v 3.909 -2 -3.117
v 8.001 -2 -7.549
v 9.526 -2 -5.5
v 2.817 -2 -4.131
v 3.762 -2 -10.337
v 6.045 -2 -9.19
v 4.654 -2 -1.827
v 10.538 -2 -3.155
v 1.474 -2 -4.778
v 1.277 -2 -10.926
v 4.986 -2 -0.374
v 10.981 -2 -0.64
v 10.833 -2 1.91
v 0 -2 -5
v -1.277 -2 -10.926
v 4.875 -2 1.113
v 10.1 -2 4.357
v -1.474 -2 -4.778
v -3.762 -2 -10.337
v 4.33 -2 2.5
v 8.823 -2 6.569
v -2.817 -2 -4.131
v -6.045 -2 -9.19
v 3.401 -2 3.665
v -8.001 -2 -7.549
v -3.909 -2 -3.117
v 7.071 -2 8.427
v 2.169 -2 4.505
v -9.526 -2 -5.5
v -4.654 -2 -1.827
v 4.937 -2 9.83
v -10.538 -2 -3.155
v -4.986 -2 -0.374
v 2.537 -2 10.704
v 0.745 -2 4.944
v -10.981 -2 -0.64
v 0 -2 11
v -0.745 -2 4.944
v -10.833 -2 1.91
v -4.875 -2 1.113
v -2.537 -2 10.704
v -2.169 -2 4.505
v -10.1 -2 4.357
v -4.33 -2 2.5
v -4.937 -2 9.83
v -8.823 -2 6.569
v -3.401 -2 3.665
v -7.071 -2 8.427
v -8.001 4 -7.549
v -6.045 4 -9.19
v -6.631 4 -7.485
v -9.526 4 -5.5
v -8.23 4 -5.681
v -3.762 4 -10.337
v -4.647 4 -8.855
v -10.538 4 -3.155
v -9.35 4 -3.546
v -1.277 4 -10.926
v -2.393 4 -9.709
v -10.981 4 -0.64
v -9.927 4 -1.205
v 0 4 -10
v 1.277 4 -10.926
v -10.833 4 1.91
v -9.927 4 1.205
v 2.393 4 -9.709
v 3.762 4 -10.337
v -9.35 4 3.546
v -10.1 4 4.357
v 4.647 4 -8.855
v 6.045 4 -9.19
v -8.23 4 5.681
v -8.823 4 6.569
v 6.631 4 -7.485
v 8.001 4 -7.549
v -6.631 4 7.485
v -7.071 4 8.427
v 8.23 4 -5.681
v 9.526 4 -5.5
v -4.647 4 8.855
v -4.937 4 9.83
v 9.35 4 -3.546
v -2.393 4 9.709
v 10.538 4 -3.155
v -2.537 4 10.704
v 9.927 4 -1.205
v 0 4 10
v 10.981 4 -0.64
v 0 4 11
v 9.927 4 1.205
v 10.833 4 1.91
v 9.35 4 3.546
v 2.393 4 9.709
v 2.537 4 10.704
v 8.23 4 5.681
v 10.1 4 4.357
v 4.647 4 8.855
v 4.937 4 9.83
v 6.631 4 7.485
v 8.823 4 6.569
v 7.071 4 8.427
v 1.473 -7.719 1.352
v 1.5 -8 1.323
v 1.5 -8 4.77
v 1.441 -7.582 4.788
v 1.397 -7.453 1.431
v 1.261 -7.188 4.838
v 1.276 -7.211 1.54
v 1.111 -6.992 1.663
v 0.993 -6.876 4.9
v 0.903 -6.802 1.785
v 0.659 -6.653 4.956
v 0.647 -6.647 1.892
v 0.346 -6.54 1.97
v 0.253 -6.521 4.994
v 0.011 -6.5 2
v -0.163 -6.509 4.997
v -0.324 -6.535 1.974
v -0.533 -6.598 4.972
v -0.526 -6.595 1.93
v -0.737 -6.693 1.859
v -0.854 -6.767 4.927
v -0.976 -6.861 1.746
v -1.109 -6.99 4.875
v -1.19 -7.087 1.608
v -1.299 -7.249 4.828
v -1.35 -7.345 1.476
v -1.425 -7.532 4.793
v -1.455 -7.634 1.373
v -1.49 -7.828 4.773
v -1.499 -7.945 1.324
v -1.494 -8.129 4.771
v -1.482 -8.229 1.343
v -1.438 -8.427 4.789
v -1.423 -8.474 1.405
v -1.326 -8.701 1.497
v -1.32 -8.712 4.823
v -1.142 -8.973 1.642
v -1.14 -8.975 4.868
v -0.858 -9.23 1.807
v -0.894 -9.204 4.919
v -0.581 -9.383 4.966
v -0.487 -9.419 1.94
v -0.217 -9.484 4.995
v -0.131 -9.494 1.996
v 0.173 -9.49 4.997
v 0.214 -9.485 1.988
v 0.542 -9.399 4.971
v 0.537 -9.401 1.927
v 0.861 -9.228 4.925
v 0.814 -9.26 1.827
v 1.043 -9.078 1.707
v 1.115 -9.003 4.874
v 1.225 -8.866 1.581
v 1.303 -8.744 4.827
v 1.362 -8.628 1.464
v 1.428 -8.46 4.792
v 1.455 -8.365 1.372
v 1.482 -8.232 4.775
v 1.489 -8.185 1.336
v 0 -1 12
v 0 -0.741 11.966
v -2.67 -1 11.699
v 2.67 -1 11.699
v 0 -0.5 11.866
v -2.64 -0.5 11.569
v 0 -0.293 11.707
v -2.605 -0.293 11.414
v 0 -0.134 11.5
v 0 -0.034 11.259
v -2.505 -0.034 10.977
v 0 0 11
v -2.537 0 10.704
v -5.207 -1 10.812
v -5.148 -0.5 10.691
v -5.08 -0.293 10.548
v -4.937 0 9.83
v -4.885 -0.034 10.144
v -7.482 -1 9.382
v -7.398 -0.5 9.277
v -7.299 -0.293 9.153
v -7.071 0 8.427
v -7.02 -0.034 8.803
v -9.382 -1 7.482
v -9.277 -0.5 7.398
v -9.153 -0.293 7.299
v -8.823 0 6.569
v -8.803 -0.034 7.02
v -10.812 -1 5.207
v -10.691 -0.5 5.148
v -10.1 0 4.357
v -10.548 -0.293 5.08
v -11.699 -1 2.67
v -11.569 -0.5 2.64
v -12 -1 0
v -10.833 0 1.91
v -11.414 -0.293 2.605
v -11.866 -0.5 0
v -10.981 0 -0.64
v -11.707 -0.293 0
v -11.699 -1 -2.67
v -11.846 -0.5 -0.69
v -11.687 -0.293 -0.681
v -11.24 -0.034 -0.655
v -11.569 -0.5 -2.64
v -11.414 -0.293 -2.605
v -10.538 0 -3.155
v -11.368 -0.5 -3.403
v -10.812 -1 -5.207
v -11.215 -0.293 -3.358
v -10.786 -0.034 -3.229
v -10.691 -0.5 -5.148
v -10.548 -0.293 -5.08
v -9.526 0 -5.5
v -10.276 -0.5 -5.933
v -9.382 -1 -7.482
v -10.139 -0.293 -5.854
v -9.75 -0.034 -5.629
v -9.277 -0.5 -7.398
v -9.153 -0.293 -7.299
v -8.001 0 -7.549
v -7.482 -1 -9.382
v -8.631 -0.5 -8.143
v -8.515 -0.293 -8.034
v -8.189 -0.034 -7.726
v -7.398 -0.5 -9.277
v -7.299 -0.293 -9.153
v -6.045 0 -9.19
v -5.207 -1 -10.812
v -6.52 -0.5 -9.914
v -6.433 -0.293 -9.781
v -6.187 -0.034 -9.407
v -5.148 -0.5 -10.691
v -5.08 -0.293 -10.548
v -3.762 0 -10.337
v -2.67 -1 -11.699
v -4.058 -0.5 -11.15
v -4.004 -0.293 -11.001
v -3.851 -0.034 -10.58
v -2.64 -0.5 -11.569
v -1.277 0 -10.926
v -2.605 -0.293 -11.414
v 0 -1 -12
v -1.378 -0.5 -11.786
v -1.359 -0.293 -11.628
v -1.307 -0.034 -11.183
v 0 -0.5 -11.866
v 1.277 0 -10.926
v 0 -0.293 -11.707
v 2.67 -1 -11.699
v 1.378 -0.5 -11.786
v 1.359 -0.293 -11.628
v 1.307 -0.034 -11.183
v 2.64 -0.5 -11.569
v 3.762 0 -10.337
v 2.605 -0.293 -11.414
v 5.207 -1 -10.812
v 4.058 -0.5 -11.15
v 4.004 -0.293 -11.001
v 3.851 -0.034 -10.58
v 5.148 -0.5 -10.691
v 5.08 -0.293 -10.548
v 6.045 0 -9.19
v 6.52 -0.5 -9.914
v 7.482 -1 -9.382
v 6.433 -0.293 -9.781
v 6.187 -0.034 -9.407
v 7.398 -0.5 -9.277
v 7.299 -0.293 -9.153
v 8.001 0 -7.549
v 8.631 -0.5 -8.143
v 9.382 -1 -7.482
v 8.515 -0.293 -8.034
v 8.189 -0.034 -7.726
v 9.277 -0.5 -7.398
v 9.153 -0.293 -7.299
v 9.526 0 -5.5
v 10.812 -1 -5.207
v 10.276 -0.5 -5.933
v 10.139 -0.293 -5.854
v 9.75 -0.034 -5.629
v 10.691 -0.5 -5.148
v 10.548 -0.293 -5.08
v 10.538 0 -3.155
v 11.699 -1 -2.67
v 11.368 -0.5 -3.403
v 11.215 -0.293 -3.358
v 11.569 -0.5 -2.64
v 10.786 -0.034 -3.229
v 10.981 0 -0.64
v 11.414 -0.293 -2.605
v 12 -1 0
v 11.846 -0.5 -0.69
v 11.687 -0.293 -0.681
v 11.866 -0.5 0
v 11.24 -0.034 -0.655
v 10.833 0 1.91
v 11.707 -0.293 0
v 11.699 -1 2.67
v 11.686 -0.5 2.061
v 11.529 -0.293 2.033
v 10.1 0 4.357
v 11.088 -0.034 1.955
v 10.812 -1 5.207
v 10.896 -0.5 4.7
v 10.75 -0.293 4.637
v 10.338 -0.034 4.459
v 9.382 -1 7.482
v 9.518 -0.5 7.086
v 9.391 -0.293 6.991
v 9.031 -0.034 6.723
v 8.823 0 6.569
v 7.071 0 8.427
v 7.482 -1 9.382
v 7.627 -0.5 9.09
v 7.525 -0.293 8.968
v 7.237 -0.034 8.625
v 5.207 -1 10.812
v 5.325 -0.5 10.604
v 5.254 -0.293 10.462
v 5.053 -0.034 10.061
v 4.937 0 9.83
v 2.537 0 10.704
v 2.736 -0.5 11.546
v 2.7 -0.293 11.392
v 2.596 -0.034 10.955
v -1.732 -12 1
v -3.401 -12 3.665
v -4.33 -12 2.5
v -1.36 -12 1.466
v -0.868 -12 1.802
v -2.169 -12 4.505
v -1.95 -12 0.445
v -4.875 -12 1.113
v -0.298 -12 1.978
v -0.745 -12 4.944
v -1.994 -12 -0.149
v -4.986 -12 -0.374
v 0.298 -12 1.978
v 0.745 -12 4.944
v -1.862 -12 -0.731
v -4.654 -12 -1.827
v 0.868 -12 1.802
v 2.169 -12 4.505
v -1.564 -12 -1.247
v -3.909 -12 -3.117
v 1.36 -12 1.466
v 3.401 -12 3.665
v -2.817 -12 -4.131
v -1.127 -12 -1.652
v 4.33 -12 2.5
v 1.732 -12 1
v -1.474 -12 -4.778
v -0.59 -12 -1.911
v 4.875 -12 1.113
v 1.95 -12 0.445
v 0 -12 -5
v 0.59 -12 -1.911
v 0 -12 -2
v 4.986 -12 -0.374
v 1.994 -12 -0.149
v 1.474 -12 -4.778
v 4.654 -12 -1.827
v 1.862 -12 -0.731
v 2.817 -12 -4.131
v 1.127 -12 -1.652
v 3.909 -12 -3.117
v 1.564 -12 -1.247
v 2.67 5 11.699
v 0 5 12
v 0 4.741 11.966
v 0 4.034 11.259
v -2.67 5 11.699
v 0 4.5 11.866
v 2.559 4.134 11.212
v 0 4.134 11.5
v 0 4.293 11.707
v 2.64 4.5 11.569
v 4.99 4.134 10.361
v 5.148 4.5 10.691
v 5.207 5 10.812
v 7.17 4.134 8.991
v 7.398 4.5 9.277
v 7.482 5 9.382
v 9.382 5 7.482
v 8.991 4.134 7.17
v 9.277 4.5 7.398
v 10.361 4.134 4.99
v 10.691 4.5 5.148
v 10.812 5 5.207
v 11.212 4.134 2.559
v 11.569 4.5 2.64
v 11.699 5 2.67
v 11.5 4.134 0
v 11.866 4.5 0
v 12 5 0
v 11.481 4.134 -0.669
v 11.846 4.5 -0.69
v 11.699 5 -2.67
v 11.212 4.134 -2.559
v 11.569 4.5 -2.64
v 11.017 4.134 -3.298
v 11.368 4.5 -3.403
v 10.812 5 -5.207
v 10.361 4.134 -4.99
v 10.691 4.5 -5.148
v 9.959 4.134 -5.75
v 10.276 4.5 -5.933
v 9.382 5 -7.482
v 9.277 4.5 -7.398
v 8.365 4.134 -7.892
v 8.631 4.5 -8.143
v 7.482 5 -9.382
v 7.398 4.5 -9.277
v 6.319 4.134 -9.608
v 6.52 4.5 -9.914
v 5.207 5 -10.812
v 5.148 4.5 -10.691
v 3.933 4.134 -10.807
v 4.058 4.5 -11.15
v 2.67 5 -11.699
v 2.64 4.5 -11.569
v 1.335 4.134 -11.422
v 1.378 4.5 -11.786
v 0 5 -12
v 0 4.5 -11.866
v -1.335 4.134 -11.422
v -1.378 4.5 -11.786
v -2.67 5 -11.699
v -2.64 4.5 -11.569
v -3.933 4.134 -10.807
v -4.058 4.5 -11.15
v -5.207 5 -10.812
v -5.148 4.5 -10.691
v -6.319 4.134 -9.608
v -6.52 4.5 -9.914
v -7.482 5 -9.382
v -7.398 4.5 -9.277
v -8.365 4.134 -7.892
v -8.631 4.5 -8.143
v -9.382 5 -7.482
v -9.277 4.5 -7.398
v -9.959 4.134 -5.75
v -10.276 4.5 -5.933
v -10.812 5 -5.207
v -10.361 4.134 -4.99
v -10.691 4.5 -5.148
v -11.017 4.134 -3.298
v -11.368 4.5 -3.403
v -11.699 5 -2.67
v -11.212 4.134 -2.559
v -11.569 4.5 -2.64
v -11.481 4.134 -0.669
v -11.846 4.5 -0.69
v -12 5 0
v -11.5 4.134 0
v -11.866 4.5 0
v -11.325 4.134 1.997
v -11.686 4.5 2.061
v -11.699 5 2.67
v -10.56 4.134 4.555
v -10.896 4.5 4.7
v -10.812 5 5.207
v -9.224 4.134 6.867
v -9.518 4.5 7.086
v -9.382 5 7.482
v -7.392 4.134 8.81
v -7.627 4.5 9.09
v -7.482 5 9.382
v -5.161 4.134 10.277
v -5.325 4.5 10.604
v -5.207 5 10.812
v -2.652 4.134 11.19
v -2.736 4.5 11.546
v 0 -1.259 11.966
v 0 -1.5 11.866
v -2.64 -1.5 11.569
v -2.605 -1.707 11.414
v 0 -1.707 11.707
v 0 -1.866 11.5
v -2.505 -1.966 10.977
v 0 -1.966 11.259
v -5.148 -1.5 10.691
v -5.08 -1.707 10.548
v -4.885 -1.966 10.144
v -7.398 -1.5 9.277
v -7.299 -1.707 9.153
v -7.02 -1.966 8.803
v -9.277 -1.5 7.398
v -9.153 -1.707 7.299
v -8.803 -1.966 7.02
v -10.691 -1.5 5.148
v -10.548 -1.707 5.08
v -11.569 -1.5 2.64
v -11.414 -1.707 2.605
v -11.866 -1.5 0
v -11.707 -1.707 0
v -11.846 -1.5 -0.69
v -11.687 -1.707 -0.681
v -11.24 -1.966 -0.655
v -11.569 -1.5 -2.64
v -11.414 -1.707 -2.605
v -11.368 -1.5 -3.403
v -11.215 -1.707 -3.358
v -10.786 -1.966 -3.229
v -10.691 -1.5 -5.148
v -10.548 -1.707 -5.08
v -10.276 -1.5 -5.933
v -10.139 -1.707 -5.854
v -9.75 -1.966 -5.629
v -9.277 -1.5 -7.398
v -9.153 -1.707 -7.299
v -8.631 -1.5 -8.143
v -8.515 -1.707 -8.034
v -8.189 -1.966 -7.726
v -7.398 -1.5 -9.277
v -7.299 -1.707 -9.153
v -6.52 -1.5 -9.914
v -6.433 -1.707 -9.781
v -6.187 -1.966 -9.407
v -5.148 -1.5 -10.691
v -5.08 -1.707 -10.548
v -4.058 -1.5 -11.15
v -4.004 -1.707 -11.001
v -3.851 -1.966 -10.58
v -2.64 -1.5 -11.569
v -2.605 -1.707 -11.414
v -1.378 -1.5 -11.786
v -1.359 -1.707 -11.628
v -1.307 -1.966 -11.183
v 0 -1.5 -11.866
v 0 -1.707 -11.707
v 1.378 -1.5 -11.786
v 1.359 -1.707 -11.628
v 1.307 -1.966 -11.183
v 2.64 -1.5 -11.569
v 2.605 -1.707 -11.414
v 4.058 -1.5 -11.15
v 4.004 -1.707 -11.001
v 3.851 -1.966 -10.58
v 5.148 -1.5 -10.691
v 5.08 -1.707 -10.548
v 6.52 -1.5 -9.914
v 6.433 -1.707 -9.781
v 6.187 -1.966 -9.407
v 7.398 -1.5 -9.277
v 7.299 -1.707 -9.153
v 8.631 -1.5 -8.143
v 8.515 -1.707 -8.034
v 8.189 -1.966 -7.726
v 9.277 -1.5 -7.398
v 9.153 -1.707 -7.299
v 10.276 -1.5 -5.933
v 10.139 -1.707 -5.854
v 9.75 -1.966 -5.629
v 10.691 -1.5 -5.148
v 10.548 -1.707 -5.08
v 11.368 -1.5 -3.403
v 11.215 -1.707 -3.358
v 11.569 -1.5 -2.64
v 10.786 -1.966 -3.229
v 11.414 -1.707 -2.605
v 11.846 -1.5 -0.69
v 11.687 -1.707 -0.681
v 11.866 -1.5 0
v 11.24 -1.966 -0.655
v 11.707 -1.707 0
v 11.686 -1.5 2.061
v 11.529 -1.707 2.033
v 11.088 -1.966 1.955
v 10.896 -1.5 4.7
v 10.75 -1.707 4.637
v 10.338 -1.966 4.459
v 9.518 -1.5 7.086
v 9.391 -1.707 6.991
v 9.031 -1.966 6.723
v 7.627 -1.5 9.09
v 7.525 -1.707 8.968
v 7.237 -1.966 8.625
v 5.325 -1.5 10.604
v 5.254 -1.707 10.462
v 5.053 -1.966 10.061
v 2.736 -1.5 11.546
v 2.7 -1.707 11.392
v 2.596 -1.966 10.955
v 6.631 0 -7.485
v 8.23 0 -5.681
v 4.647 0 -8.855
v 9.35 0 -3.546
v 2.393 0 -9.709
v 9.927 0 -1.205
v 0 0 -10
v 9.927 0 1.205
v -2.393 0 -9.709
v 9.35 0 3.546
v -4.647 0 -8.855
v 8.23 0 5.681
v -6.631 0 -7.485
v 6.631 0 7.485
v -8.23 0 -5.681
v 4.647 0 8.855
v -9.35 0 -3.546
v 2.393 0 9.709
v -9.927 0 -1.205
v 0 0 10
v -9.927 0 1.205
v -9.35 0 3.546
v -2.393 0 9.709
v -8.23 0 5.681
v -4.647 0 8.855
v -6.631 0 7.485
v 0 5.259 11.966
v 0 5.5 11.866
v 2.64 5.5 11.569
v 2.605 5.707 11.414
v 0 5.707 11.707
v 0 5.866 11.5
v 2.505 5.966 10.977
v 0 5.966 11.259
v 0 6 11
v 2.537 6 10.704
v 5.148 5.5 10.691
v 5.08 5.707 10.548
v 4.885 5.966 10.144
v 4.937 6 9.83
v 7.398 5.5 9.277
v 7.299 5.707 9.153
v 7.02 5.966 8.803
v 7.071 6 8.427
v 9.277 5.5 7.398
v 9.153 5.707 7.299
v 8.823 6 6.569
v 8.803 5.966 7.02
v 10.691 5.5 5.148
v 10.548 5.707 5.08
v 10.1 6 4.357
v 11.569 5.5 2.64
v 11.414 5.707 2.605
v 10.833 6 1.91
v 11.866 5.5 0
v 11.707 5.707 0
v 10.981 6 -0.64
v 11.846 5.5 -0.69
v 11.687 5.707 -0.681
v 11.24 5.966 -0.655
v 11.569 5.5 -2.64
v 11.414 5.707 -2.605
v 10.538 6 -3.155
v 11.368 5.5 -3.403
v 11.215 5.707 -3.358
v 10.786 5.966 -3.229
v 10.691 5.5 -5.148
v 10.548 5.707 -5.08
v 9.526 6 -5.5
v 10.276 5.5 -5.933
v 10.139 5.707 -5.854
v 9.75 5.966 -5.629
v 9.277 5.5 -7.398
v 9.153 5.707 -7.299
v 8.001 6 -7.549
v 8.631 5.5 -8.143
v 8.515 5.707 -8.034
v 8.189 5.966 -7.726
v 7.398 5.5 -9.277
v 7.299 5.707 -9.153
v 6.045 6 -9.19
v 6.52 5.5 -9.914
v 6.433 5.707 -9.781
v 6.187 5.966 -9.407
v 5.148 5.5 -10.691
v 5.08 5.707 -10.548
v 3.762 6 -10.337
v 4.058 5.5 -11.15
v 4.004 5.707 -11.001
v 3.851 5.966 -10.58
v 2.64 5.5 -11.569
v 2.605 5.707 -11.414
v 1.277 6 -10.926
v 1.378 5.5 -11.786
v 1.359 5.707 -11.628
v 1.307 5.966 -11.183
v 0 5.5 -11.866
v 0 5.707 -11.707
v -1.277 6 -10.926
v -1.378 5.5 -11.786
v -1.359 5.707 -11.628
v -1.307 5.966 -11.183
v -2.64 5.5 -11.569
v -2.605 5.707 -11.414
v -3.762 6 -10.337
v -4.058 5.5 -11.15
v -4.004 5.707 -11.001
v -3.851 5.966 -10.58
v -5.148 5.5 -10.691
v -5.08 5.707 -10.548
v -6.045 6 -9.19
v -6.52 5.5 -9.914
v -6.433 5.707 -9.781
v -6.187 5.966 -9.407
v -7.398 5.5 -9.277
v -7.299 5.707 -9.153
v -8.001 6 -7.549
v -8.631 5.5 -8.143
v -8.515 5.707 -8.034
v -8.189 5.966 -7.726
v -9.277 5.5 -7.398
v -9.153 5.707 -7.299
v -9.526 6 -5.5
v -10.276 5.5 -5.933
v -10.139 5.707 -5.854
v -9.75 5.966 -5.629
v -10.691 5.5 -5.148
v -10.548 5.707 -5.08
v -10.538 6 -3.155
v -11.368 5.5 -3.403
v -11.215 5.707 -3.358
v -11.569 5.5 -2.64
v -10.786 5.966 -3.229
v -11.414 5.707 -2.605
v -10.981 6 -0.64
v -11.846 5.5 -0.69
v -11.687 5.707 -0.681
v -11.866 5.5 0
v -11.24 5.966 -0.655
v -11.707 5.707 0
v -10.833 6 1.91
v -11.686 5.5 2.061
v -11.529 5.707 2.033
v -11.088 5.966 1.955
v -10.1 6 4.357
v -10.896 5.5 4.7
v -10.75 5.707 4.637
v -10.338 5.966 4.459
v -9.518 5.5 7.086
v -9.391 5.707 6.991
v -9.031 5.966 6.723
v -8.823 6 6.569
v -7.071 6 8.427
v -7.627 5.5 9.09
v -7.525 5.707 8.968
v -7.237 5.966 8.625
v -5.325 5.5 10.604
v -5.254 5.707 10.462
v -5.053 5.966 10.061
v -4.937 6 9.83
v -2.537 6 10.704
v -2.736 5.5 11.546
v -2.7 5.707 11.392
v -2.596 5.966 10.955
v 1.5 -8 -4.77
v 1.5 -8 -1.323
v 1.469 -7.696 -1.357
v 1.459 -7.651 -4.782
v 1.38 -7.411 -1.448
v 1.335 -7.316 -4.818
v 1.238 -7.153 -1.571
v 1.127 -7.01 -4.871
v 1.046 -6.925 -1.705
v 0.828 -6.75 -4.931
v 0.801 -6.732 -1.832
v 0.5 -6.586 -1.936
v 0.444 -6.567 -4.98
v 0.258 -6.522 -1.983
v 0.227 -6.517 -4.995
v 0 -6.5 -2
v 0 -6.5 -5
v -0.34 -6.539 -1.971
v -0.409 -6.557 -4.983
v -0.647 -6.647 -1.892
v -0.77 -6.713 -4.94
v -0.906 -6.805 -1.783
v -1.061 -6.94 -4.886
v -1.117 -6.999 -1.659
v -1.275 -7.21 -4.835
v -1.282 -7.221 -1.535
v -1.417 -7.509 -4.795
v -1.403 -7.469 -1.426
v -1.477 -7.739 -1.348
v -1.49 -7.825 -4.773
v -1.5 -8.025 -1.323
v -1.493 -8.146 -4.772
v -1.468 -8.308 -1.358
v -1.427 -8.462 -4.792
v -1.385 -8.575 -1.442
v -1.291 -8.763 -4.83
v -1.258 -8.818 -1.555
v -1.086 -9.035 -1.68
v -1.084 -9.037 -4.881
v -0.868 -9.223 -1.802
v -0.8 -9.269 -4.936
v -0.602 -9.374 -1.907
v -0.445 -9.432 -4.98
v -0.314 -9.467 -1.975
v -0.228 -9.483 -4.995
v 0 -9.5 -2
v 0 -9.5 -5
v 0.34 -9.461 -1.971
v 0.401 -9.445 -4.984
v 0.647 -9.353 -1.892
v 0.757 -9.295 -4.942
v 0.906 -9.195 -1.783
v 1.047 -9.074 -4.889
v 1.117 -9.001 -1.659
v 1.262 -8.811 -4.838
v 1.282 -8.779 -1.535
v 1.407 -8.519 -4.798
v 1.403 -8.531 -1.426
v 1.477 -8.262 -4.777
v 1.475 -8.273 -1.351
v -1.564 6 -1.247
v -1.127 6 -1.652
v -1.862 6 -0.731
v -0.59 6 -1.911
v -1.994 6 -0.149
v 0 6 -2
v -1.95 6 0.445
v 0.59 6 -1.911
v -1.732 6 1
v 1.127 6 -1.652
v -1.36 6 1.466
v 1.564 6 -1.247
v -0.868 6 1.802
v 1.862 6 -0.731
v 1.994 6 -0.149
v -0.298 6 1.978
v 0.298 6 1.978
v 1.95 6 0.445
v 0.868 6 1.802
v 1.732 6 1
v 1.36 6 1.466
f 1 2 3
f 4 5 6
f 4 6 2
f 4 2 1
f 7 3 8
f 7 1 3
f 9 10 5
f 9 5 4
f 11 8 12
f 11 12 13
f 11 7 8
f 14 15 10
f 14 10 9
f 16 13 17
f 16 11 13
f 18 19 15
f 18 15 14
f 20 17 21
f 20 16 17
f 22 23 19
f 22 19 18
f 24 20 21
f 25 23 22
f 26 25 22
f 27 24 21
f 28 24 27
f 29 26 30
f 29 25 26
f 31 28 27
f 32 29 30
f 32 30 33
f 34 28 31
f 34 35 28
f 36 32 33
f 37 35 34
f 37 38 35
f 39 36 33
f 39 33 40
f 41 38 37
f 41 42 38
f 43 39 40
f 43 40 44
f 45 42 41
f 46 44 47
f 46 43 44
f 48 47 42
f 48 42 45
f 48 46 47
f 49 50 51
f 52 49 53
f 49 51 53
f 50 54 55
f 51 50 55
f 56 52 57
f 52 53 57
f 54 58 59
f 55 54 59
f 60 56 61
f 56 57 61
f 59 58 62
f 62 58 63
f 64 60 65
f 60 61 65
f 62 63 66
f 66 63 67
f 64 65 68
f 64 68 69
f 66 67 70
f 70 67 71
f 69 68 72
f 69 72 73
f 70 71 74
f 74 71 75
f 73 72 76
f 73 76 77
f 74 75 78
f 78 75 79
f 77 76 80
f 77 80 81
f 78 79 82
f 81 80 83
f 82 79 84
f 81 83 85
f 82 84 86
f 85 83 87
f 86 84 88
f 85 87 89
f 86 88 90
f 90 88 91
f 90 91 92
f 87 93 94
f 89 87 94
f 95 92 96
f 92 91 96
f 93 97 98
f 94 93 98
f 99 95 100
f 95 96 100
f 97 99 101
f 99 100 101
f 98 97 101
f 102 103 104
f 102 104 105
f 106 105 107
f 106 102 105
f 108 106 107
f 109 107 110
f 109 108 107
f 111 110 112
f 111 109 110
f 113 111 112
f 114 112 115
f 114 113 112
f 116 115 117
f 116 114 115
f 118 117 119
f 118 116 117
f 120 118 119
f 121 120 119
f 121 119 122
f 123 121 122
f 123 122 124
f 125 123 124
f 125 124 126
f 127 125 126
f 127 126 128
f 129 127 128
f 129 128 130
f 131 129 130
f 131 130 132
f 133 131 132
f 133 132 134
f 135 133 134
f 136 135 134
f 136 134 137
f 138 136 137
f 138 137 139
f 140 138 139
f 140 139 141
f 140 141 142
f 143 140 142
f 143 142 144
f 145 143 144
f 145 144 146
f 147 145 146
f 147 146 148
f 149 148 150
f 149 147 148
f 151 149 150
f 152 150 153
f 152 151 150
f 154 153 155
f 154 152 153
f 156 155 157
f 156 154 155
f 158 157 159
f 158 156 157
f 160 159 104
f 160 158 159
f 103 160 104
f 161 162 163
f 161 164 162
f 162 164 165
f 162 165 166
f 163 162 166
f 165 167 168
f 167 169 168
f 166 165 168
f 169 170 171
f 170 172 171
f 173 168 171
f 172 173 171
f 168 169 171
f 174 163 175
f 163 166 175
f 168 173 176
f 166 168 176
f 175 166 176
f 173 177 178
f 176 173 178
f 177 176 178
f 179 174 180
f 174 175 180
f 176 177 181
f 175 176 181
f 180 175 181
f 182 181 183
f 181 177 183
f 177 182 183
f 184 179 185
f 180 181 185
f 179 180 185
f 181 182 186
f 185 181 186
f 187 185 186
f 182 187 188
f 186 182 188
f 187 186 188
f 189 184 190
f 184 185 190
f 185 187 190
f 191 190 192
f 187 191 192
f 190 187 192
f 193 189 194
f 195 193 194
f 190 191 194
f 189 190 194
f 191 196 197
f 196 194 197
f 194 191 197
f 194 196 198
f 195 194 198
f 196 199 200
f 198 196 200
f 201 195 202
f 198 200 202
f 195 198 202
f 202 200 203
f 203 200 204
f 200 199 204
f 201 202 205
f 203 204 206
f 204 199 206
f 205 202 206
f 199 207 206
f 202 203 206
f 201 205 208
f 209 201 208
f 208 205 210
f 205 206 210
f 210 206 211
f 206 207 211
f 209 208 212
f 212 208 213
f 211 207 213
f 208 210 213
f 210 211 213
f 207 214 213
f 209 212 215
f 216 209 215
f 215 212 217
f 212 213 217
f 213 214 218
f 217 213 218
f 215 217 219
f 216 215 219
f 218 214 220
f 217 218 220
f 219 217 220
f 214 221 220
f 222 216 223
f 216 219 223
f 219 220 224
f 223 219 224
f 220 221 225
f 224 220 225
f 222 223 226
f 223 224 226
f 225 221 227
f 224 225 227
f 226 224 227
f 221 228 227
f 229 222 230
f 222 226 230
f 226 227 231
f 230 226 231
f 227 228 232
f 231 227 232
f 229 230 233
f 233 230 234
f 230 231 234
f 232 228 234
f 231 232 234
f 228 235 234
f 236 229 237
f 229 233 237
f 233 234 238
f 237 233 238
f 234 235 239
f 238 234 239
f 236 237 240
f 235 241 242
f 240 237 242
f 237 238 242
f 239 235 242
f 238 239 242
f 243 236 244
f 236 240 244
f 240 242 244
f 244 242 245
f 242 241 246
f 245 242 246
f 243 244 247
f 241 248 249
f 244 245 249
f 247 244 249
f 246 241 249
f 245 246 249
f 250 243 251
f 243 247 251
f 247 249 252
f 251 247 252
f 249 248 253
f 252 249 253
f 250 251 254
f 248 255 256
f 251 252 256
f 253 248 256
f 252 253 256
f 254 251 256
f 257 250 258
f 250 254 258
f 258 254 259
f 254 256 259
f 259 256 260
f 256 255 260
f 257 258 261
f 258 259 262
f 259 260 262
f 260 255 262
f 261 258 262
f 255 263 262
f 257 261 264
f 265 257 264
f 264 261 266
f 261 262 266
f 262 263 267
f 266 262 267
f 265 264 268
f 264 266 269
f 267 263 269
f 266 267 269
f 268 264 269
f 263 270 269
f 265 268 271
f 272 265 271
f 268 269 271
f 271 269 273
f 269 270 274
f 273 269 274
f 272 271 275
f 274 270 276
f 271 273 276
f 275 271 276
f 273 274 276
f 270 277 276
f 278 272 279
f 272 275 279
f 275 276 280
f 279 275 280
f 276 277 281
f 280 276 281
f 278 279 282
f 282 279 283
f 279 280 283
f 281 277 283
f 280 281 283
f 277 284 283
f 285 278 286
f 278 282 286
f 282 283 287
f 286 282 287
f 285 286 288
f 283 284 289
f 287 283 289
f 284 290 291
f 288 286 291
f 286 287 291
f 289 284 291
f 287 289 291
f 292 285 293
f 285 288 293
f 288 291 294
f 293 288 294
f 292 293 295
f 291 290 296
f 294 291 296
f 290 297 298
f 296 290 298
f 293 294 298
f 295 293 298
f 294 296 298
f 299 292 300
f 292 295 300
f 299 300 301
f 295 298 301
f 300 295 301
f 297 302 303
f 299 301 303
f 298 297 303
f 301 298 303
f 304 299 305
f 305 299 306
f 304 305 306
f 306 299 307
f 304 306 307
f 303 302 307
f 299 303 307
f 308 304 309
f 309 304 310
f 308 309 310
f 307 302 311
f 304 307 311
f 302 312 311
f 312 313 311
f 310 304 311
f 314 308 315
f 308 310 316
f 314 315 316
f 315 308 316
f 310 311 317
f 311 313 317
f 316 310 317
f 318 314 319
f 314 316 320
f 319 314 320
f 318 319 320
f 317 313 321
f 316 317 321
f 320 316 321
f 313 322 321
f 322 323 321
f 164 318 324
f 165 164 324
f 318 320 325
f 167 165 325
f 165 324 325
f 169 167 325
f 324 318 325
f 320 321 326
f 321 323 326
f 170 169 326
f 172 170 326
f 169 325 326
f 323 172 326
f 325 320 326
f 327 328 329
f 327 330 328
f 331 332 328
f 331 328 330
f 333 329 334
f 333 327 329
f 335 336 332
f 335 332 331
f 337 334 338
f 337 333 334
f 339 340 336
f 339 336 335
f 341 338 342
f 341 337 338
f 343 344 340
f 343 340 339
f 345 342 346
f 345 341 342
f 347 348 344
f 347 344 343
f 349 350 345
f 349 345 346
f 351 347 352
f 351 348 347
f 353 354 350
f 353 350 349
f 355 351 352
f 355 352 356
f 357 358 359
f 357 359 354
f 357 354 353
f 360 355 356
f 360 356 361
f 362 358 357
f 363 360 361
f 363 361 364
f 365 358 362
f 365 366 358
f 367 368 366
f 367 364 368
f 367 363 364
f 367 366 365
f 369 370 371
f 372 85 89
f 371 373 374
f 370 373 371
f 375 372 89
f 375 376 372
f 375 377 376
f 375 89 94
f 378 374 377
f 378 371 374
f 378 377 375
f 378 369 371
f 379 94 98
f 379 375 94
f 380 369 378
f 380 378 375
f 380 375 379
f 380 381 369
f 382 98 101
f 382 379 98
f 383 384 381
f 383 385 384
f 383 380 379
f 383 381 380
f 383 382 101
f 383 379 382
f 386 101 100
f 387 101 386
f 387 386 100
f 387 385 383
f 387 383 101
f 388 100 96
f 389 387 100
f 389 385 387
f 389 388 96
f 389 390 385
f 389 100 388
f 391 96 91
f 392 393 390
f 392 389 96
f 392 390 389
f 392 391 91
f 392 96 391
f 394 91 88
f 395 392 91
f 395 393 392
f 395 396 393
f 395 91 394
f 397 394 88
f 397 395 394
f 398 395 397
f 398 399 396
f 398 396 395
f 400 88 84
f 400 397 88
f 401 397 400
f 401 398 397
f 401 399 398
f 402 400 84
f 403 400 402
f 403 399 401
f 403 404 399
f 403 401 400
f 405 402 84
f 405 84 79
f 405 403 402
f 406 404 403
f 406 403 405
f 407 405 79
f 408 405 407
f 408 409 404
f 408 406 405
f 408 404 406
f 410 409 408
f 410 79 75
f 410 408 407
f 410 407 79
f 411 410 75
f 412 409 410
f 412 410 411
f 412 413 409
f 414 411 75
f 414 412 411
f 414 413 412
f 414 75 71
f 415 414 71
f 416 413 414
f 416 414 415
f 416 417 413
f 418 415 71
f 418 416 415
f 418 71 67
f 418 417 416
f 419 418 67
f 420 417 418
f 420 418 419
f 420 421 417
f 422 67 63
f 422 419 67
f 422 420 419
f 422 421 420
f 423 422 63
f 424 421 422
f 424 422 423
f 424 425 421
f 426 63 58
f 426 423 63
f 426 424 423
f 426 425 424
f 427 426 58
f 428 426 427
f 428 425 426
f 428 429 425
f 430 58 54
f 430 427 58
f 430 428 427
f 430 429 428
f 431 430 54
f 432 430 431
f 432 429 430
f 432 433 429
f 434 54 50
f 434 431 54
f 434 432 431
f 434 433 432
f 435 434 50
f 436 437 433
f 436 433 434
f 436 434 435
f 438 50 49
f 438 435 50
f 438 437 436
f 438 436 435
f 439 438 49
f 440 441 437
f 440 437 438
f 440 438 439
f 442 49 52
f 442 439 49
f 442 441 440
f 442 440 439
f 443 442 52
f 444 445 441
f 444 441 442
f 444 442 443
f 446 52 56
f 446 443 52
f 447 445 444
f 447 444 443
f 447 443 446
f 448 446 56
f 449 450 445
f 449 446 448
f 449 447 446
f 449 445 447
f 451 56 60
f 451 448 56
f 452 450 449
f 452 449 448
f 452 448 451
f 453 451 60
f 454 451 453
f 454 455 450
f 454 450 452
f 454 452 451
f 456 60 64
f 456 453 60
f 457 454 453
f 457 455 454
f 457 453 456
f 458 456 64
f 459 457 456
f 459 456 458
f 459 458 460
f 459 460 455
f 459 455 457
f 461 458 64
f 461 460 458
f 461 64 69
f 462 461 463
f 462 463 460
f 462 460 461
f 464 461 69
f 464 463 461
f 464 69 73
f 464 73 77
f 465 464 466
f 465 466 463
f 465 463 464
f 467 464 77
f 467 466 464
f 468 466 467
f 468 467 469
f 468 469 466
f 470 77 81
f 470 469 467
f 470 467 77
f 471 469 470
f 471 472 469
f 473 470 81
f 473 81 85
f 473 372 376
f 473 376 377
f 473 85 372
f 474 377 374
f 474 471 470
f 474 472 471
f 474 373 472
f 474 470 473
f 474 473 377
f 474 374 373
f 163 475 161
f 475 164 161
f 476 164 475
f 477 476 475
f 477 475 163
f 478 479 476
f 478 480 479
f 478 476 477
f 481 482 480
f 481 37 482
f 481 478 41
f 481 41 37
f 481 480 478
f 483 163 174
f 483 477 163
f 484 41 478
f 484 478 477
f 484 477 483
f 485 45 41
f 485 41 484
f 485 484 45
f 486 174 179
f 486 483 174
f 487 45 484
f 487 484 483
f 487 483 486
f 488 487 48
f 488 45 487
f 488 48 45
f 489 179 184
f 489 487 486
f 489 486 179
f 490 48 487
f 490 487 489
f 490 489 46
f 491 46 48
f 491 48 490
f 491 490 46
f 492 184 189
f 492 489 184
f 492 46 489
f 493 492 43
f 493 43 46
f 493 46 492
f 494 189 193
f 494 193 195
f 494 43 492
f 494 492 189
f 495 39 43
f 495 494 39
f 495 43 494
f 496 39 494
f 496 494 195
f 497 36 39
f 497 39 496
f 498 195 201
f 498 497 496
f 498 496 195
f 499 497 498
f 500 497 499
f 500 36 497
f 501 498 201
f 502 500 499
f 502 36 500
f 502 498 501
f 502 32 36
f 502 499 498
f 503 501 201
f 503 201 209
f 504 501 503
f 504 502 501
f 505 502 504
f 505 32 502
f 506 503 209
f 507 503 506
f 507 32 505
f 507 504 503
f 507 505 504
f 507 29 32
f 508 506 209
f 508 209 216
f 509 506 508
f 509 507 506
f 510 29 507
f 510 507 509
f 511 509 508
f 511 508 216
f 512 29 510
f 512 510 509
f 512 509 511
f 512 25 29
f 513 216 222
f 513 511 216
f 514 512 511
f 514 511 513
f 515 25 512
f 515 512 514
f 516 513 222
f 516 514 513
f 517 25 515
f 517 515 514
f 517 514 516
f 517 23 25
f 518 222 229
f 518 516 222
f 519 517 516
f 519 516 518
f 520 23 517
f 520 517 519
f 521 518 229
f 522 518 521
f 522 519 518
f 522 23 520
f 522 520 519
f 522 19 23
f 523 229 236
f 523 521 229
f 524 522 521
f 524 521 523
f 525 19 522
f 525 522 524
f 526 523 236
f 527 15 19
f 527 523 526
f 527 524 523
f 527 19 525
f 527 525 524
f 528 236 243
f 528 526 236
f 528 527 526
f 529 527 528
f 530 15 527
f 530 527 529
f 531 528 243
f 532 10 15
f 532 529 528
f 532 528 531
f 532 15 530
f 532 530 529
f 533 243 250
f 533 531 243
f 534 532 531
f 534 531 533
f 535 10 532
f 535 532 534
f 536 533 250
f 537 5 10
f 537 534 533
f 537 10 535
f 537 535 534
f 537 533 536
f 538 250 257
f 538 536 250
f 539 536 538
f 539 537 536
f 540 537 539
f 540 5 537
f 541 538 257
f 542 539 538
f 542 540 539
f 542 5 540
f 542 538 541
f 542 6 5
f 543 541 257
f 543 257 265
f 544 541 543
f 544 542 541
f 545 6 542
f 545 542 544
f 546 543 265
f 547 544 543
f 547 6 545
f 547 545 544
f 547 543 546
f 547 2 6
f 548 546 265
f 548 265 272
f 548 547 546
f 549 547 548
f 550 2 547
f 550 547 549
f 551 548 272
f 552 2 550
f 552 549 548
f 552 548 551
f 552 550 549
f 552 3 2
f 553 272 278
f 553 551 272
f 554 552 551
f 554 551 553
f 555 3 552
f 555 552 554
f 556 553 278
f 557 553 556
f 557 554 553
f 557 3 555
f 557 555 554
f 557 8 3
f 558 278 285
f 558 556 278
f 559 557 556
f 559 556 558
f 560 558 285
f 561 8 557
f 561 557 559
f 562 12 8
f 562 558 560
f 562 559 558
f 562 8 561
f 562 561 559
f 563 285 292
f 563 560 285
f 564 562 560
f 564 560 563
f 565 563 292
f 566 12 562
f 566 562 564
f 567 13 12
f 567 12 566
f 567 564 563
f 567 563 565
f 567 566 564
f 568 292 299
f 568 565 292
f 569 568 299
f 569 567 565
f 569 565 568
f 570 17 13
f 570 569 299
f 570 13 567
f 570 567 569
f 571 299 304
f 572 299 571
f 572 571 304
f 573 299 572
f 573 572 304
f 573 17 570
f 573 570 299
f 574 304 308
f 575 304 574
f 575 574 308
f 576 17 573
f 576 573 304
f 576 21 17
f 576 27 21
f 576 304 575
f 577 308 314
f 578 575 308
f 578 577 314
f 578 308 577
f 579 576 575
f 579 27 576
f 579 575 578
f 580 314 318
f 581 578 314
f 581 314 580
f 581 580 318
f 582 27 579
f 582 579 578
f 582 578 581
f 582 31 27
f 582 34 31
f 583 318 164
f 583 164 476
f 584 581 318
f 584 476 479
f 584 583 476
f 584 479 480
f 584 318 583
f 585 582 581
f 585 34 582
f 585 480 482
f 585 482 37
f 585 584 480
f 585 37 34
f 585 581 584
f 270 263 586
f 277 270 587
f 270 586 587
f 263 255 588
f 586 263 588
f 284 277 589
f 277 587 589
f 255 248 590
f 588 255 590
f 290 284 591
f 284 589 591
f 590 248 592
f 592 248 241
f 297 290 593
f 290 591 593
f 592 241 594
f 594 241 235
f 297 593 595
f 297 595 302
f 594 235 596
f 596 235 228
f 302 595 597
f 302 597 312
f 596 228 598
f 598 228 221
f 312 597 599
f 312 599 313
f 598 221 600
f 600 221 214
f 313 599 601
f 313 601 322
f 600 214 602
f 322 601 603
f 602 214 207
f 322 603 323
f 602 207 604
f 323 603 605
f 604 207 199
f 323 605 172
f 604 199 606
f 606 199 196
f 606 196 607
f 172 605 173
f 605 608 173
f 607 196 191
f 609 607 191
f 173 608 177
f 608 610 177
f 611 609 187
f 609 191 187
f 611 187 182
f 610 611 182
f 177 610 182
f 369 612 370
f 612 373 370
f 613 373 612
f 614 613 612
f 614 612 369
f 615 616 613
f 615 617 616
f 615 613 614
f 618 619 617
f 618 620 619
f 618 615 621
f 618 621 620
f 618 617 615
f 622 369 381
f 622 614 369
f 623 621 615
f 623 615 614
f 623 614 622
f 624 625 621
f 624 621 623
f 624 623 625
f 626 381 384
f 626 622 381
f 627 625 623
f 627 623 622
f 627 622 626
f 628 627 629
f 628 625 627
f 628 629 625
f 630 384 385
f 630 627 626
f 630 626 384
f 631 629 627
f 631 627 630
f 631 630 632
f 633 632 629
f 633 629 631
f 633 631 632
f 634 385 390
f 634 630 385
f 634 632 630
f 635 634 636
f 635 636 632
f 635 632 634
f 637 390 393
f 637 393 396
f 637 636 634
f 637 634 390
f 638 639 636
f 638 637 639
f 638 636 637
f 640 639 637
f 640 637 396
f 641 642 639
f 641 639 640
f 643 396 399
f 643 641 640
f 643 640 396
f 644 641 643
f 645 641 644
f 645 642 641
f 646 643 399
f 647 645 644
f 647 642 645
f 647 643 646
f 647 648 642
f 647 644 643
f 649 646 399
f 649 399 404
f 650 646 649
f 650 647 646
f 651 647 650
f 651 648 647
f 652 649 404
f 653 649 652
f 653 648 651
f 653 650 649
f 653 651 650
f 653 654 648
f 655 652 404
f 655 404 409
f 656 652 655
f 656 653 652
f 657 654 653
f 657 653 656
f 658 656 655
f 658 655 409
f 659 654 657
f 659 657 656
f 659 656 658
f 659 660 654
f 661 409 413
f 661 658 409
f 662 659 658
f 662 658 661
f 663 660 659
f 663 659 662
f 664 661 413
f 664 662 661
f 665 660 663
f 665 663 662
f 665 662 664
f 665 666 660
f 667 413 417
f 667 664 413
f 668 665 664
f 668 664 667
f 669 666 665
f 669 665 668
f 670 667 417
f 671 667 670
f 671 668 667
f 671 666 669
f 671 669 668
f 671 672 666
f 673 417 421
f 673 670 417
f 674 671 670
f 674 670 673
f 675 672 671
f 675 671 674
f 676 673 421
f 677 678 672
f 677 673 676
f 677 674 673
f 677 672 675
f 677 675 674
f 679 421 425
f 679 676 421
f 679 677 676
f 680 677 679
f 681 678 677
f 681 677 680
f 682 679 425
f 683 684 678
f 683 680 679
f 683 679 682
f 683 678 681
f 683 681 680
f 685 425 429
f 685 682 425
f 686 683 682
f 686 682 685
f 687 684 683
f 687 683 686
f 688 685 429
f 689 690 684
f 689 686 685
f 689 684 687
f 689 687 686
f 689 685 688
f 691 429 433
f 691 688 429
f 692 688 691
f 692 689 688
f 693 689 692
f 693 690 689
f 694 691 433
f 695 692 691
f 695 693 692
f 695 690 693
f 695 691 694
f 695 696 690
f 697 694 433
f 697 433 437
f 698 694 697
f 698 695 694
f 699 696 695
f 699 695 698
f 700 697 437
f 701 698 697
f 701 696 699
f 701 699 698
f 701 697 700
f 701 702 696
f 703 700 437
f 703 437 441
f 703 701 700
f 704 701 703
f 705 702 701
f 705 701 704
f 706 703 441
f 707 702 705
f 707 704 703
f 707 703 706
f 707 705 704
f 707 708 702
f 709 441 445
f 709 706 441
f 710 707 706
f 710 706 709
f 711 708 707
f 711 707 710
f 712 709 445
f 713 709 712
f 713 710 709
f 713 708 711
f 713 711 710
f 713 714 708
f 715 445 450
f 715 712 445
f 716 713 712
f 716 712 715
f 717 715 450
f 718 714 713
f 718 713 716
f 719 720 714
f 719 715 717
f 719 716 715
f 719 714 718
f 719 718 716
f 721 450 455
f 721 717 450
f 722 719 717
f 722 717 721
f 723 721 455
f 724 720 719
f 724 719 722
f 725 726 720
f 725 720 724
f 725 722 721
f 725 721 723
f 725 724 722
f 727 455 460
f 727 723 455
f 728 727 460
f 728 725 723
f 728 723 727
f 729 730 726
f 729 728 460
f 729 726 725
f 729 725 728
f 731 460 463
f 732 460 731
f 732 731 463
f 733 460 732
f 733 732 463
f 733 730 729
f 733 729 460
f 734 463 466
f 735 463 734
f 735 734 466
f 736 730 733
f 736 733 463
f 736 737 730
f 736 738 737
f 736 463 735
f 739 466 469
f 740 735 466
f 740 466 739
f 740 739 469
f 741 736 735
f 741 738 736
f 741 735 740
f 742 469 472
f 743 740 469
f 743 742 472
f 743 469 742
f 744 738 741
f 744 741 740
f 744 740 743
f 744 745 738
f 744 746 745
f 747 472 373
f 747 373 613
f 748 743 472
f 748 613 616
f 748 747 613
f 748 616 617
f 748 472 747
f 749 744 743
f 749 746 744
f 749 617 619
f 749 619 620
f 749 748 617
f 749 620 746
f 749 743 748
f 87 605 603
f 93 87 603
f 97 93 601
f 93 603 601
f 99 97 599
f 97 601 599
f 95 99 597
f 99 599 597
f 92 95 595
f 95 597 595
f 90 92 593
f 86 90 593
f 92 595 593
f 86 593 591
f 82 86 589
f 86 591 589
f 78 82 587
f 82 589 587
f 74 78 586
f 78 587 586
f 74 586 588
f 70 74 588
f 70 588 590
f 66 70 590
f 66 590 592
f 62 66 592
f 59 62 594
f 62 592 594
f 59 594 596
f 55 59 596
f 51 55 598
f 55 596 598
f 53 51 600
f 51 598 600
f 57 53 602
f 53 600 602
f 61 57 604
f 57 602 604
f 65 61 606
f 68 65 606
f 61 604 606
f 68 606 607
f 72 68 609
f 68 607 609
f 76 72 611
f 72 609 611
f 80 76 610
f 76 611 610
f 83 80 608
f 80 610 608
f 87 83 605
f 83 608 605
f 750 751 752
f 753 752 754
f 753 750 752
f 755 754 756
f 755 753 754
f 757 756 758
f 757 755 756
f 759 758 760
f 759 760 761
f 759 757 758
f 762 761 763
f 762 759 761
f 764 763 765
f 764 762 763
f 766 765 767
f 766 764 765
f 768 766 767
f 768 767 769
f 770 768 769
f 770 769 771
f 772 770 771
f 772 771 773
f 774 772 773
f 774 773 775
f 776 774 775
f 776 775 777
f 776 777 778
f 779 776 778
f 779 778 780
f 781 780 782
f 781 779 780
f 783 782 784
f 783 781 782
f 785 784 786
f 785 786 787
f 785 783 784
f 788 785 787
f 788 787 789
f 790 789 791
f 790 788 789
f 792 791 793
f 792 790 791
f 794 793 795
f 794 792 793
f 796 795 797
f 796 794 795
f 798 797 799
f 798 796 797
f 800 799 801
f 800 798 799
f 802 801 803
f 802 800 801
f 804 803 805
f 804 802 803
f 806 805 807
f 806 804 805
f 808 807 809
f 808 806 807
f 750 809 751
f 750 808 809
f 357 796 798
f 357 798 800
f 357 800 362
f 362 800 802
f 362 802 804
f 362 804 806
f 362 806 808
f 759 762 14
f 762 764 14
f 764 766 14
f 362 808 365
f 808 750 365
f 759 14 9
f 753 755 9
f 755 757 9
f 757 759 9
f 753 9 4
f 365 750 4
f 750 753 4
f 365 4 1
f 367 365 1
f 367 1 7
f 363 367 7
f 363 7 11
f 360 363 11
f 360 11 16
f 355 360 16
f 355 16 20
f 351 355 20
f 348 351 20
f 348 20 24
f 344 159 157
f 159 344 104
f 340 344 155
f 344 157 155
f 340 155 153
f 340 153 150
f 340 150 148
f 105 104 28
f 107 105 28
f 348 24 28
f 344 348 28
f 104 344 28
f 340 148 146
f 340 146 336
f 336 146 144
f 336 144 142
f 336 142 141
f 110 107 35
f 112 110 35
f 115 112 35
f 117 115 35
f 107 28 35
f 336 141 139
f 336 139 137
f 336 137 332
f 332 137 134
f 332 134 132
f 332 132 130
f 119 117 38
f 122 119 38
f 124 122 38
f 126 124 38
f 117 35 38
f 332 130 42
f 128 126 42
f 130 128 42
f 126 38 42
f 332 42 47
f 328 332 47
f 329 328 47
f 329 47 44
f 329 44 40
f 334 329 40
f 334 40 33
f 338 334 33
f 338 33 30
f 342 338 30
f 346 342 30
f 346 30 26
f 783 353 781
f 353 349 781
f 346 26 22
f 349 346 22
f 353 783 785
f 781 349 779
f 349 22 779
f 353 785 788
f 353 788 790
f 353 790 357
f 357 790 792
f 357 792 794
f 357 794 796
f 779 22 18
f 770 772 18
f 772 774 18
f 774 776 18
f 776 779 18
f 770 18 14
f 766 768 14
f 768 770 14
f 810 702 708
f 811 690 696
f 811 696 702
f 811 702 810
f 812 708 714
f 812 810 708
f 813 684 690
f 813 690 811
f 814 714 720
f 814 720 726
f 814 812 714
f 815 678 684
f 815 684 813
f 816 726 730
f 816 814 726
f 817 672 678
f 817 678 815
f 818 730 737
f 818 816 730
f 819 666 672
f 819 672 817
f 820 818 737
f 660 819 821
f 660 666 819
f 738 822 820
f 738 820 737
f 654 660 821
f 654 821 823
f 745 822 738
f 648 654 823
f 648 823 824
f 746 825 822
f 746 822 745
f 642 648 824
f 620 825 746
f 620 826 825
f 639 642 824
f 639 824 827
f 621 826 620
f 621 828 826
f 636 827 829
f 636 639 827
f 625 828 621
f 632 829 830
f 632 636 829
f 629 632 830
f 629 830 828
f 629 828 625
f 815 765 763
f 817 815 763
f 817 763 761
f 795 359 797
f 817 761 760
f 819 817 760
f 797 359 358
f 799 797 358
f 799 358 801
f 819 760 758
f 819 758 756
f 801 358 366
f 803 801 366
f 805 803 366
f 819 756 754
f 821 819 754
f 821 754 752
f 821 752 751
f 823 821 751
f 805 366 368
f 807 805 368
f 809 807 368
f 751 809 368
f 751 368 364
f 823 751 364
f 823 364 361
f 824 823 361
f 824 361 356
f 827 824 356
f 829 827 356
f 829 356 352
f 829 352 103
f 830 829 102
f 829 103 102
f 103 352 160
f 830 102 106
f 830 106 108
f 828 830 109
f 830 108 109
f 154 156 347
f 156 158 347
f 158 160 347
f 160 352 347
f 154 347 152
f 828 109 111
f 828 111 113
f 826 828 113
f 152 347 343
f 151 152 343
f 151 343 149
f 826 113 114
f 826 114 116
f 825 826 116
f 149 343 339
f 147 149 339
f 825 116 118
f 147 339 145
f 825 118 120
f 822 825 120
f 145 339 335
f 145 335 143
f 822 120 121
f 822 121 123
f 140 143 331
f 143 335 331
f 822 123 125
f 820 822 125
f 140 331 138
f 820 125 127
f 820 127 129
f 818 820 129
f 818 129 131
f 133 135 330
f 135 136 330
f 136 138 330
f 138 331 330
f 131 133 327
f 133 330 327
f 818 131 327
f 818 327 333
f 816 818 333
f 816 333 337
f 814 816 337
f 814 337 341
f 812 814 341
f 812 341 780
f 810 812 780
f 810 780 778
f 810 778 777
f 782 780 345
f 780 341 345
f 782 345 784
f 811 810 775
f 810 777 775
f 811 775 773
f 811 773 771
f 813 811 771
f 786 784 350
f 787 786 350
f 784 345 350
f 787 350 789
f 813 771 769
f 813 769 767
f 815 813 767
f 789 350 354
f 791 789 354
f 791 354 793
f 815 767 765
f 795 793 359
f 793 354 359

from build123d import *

# Parameters (mm, degrees)
SKETCH_1_R               = 10
EXTRUDE_1_DEPTH          = 4
SKETCH_2_R               = 12
EXTRUDE_2_DEPTH          = 2
EXTRUDE_START            = 2
SKETCH_3_R               = 12
EXTRUDE_3_DEPTH          = 2
SKETCH_4_R               = 5
EXTRUDE_4_DEPTH          = 10
SKETCH_5_R               = 2
CUT_EXTRUDE_1_DEPTH      = 25.738633754
FILLET_2_R               = 1
CUT_EXTRUDE_2_DEPTH      = 10
CUT_EXTRUDE_2_DEPTH_BACK = 10
SKETCH_6_R               = 1.5


with BuildPart() as part:
    # 草图1 → 凸台-拉伸1 (new body)
    with BuildSketch(Plane(origin=(0, 0, 0), x_dir=(1, 0, 0), z_dir=(0, 1, 0))):
        with Locations(Location((0, 0, 0), (0, 0, 270))):
            Circle(SKETCH_1_R)
    extrude(amount=EXTRUDE_1_DEPTH)

    # 草图2 → 凸台-拉伸2 (add)
    with BuildSketch(Plane(origin=(0, 4, 0), x_dir=(1, 0, 0), z_dir=(0, 1, 0))):
        with Locations(Location((0, 0, 0), (0, 0, 270))):
            Circle(SKETCH_2_R)
    extrude(amount=EXTRUDE_2_DEPTH)

    # 草图3 → 凸台-拉伸3 (add)
    with BuildSketch(Plane.XZ.offset(EXTRUDE_START)):
        with Locations(Location((0, 0, 0), (0, 0, 90))):
            Circle(SKETCH_3_R)
    extrude(amount=-EXTRUDE_3_DEPTH)

    # 草图4 → 凸台-拉伸4 (add)
    with BuildSketch(Plane(origin=(0, -2, 0), x_dir=(-1, 0, 0), z_dir=(0, -1, 0))):
        with Locations(Location((0, 0, 0), (0, 0, 90))):
            Circle(SKETCH_4_R)
    extrude(amount=EXTRUDE_4_DEPTH)

    # 草图5 → 切除-拉伸1 (cut, through all)
    with BuildSketch(Plane.XZ.offset(12)):
        with Locations(Location((0, 0, 0), (0, 0, 270))):
            Circle(SKETCH_5_R)
    extrude(amount=-CUT_EXTRUDE_1_DEPTH, mode=Mode.SUBTRACT)

    # 圆角2
    fillet_2_edges = [part.edges().sort_by_distance(p)[0] for p in [
        (0, -2, -12),
        (0, 4, -12),
        (0, 6, -12),
        (0, 0, -12),
    ]]
    fillet(fillet_2_edges, radius=FILLET_2_R - 0.0001)  # a hair under: the kernel refuses the full size

    # 草图6 → 切除-拉伸2 (cut, two sides: drawn at the far end of the back side and taken through both)
    with BuildSketch(Plane.XY.offset(-CUT_EXTRUDE_2_DEPTH_BACK)):
        with Locations((0, -8)):
            Circle(SKETCH_6_R)
    extrude(amount=CUT_EXTRUDE_2_DEPTH + CUT_EXTRUDE_2_DEPTH_BACK, mode=Mode.SUBTRACT)


solid = part.part
